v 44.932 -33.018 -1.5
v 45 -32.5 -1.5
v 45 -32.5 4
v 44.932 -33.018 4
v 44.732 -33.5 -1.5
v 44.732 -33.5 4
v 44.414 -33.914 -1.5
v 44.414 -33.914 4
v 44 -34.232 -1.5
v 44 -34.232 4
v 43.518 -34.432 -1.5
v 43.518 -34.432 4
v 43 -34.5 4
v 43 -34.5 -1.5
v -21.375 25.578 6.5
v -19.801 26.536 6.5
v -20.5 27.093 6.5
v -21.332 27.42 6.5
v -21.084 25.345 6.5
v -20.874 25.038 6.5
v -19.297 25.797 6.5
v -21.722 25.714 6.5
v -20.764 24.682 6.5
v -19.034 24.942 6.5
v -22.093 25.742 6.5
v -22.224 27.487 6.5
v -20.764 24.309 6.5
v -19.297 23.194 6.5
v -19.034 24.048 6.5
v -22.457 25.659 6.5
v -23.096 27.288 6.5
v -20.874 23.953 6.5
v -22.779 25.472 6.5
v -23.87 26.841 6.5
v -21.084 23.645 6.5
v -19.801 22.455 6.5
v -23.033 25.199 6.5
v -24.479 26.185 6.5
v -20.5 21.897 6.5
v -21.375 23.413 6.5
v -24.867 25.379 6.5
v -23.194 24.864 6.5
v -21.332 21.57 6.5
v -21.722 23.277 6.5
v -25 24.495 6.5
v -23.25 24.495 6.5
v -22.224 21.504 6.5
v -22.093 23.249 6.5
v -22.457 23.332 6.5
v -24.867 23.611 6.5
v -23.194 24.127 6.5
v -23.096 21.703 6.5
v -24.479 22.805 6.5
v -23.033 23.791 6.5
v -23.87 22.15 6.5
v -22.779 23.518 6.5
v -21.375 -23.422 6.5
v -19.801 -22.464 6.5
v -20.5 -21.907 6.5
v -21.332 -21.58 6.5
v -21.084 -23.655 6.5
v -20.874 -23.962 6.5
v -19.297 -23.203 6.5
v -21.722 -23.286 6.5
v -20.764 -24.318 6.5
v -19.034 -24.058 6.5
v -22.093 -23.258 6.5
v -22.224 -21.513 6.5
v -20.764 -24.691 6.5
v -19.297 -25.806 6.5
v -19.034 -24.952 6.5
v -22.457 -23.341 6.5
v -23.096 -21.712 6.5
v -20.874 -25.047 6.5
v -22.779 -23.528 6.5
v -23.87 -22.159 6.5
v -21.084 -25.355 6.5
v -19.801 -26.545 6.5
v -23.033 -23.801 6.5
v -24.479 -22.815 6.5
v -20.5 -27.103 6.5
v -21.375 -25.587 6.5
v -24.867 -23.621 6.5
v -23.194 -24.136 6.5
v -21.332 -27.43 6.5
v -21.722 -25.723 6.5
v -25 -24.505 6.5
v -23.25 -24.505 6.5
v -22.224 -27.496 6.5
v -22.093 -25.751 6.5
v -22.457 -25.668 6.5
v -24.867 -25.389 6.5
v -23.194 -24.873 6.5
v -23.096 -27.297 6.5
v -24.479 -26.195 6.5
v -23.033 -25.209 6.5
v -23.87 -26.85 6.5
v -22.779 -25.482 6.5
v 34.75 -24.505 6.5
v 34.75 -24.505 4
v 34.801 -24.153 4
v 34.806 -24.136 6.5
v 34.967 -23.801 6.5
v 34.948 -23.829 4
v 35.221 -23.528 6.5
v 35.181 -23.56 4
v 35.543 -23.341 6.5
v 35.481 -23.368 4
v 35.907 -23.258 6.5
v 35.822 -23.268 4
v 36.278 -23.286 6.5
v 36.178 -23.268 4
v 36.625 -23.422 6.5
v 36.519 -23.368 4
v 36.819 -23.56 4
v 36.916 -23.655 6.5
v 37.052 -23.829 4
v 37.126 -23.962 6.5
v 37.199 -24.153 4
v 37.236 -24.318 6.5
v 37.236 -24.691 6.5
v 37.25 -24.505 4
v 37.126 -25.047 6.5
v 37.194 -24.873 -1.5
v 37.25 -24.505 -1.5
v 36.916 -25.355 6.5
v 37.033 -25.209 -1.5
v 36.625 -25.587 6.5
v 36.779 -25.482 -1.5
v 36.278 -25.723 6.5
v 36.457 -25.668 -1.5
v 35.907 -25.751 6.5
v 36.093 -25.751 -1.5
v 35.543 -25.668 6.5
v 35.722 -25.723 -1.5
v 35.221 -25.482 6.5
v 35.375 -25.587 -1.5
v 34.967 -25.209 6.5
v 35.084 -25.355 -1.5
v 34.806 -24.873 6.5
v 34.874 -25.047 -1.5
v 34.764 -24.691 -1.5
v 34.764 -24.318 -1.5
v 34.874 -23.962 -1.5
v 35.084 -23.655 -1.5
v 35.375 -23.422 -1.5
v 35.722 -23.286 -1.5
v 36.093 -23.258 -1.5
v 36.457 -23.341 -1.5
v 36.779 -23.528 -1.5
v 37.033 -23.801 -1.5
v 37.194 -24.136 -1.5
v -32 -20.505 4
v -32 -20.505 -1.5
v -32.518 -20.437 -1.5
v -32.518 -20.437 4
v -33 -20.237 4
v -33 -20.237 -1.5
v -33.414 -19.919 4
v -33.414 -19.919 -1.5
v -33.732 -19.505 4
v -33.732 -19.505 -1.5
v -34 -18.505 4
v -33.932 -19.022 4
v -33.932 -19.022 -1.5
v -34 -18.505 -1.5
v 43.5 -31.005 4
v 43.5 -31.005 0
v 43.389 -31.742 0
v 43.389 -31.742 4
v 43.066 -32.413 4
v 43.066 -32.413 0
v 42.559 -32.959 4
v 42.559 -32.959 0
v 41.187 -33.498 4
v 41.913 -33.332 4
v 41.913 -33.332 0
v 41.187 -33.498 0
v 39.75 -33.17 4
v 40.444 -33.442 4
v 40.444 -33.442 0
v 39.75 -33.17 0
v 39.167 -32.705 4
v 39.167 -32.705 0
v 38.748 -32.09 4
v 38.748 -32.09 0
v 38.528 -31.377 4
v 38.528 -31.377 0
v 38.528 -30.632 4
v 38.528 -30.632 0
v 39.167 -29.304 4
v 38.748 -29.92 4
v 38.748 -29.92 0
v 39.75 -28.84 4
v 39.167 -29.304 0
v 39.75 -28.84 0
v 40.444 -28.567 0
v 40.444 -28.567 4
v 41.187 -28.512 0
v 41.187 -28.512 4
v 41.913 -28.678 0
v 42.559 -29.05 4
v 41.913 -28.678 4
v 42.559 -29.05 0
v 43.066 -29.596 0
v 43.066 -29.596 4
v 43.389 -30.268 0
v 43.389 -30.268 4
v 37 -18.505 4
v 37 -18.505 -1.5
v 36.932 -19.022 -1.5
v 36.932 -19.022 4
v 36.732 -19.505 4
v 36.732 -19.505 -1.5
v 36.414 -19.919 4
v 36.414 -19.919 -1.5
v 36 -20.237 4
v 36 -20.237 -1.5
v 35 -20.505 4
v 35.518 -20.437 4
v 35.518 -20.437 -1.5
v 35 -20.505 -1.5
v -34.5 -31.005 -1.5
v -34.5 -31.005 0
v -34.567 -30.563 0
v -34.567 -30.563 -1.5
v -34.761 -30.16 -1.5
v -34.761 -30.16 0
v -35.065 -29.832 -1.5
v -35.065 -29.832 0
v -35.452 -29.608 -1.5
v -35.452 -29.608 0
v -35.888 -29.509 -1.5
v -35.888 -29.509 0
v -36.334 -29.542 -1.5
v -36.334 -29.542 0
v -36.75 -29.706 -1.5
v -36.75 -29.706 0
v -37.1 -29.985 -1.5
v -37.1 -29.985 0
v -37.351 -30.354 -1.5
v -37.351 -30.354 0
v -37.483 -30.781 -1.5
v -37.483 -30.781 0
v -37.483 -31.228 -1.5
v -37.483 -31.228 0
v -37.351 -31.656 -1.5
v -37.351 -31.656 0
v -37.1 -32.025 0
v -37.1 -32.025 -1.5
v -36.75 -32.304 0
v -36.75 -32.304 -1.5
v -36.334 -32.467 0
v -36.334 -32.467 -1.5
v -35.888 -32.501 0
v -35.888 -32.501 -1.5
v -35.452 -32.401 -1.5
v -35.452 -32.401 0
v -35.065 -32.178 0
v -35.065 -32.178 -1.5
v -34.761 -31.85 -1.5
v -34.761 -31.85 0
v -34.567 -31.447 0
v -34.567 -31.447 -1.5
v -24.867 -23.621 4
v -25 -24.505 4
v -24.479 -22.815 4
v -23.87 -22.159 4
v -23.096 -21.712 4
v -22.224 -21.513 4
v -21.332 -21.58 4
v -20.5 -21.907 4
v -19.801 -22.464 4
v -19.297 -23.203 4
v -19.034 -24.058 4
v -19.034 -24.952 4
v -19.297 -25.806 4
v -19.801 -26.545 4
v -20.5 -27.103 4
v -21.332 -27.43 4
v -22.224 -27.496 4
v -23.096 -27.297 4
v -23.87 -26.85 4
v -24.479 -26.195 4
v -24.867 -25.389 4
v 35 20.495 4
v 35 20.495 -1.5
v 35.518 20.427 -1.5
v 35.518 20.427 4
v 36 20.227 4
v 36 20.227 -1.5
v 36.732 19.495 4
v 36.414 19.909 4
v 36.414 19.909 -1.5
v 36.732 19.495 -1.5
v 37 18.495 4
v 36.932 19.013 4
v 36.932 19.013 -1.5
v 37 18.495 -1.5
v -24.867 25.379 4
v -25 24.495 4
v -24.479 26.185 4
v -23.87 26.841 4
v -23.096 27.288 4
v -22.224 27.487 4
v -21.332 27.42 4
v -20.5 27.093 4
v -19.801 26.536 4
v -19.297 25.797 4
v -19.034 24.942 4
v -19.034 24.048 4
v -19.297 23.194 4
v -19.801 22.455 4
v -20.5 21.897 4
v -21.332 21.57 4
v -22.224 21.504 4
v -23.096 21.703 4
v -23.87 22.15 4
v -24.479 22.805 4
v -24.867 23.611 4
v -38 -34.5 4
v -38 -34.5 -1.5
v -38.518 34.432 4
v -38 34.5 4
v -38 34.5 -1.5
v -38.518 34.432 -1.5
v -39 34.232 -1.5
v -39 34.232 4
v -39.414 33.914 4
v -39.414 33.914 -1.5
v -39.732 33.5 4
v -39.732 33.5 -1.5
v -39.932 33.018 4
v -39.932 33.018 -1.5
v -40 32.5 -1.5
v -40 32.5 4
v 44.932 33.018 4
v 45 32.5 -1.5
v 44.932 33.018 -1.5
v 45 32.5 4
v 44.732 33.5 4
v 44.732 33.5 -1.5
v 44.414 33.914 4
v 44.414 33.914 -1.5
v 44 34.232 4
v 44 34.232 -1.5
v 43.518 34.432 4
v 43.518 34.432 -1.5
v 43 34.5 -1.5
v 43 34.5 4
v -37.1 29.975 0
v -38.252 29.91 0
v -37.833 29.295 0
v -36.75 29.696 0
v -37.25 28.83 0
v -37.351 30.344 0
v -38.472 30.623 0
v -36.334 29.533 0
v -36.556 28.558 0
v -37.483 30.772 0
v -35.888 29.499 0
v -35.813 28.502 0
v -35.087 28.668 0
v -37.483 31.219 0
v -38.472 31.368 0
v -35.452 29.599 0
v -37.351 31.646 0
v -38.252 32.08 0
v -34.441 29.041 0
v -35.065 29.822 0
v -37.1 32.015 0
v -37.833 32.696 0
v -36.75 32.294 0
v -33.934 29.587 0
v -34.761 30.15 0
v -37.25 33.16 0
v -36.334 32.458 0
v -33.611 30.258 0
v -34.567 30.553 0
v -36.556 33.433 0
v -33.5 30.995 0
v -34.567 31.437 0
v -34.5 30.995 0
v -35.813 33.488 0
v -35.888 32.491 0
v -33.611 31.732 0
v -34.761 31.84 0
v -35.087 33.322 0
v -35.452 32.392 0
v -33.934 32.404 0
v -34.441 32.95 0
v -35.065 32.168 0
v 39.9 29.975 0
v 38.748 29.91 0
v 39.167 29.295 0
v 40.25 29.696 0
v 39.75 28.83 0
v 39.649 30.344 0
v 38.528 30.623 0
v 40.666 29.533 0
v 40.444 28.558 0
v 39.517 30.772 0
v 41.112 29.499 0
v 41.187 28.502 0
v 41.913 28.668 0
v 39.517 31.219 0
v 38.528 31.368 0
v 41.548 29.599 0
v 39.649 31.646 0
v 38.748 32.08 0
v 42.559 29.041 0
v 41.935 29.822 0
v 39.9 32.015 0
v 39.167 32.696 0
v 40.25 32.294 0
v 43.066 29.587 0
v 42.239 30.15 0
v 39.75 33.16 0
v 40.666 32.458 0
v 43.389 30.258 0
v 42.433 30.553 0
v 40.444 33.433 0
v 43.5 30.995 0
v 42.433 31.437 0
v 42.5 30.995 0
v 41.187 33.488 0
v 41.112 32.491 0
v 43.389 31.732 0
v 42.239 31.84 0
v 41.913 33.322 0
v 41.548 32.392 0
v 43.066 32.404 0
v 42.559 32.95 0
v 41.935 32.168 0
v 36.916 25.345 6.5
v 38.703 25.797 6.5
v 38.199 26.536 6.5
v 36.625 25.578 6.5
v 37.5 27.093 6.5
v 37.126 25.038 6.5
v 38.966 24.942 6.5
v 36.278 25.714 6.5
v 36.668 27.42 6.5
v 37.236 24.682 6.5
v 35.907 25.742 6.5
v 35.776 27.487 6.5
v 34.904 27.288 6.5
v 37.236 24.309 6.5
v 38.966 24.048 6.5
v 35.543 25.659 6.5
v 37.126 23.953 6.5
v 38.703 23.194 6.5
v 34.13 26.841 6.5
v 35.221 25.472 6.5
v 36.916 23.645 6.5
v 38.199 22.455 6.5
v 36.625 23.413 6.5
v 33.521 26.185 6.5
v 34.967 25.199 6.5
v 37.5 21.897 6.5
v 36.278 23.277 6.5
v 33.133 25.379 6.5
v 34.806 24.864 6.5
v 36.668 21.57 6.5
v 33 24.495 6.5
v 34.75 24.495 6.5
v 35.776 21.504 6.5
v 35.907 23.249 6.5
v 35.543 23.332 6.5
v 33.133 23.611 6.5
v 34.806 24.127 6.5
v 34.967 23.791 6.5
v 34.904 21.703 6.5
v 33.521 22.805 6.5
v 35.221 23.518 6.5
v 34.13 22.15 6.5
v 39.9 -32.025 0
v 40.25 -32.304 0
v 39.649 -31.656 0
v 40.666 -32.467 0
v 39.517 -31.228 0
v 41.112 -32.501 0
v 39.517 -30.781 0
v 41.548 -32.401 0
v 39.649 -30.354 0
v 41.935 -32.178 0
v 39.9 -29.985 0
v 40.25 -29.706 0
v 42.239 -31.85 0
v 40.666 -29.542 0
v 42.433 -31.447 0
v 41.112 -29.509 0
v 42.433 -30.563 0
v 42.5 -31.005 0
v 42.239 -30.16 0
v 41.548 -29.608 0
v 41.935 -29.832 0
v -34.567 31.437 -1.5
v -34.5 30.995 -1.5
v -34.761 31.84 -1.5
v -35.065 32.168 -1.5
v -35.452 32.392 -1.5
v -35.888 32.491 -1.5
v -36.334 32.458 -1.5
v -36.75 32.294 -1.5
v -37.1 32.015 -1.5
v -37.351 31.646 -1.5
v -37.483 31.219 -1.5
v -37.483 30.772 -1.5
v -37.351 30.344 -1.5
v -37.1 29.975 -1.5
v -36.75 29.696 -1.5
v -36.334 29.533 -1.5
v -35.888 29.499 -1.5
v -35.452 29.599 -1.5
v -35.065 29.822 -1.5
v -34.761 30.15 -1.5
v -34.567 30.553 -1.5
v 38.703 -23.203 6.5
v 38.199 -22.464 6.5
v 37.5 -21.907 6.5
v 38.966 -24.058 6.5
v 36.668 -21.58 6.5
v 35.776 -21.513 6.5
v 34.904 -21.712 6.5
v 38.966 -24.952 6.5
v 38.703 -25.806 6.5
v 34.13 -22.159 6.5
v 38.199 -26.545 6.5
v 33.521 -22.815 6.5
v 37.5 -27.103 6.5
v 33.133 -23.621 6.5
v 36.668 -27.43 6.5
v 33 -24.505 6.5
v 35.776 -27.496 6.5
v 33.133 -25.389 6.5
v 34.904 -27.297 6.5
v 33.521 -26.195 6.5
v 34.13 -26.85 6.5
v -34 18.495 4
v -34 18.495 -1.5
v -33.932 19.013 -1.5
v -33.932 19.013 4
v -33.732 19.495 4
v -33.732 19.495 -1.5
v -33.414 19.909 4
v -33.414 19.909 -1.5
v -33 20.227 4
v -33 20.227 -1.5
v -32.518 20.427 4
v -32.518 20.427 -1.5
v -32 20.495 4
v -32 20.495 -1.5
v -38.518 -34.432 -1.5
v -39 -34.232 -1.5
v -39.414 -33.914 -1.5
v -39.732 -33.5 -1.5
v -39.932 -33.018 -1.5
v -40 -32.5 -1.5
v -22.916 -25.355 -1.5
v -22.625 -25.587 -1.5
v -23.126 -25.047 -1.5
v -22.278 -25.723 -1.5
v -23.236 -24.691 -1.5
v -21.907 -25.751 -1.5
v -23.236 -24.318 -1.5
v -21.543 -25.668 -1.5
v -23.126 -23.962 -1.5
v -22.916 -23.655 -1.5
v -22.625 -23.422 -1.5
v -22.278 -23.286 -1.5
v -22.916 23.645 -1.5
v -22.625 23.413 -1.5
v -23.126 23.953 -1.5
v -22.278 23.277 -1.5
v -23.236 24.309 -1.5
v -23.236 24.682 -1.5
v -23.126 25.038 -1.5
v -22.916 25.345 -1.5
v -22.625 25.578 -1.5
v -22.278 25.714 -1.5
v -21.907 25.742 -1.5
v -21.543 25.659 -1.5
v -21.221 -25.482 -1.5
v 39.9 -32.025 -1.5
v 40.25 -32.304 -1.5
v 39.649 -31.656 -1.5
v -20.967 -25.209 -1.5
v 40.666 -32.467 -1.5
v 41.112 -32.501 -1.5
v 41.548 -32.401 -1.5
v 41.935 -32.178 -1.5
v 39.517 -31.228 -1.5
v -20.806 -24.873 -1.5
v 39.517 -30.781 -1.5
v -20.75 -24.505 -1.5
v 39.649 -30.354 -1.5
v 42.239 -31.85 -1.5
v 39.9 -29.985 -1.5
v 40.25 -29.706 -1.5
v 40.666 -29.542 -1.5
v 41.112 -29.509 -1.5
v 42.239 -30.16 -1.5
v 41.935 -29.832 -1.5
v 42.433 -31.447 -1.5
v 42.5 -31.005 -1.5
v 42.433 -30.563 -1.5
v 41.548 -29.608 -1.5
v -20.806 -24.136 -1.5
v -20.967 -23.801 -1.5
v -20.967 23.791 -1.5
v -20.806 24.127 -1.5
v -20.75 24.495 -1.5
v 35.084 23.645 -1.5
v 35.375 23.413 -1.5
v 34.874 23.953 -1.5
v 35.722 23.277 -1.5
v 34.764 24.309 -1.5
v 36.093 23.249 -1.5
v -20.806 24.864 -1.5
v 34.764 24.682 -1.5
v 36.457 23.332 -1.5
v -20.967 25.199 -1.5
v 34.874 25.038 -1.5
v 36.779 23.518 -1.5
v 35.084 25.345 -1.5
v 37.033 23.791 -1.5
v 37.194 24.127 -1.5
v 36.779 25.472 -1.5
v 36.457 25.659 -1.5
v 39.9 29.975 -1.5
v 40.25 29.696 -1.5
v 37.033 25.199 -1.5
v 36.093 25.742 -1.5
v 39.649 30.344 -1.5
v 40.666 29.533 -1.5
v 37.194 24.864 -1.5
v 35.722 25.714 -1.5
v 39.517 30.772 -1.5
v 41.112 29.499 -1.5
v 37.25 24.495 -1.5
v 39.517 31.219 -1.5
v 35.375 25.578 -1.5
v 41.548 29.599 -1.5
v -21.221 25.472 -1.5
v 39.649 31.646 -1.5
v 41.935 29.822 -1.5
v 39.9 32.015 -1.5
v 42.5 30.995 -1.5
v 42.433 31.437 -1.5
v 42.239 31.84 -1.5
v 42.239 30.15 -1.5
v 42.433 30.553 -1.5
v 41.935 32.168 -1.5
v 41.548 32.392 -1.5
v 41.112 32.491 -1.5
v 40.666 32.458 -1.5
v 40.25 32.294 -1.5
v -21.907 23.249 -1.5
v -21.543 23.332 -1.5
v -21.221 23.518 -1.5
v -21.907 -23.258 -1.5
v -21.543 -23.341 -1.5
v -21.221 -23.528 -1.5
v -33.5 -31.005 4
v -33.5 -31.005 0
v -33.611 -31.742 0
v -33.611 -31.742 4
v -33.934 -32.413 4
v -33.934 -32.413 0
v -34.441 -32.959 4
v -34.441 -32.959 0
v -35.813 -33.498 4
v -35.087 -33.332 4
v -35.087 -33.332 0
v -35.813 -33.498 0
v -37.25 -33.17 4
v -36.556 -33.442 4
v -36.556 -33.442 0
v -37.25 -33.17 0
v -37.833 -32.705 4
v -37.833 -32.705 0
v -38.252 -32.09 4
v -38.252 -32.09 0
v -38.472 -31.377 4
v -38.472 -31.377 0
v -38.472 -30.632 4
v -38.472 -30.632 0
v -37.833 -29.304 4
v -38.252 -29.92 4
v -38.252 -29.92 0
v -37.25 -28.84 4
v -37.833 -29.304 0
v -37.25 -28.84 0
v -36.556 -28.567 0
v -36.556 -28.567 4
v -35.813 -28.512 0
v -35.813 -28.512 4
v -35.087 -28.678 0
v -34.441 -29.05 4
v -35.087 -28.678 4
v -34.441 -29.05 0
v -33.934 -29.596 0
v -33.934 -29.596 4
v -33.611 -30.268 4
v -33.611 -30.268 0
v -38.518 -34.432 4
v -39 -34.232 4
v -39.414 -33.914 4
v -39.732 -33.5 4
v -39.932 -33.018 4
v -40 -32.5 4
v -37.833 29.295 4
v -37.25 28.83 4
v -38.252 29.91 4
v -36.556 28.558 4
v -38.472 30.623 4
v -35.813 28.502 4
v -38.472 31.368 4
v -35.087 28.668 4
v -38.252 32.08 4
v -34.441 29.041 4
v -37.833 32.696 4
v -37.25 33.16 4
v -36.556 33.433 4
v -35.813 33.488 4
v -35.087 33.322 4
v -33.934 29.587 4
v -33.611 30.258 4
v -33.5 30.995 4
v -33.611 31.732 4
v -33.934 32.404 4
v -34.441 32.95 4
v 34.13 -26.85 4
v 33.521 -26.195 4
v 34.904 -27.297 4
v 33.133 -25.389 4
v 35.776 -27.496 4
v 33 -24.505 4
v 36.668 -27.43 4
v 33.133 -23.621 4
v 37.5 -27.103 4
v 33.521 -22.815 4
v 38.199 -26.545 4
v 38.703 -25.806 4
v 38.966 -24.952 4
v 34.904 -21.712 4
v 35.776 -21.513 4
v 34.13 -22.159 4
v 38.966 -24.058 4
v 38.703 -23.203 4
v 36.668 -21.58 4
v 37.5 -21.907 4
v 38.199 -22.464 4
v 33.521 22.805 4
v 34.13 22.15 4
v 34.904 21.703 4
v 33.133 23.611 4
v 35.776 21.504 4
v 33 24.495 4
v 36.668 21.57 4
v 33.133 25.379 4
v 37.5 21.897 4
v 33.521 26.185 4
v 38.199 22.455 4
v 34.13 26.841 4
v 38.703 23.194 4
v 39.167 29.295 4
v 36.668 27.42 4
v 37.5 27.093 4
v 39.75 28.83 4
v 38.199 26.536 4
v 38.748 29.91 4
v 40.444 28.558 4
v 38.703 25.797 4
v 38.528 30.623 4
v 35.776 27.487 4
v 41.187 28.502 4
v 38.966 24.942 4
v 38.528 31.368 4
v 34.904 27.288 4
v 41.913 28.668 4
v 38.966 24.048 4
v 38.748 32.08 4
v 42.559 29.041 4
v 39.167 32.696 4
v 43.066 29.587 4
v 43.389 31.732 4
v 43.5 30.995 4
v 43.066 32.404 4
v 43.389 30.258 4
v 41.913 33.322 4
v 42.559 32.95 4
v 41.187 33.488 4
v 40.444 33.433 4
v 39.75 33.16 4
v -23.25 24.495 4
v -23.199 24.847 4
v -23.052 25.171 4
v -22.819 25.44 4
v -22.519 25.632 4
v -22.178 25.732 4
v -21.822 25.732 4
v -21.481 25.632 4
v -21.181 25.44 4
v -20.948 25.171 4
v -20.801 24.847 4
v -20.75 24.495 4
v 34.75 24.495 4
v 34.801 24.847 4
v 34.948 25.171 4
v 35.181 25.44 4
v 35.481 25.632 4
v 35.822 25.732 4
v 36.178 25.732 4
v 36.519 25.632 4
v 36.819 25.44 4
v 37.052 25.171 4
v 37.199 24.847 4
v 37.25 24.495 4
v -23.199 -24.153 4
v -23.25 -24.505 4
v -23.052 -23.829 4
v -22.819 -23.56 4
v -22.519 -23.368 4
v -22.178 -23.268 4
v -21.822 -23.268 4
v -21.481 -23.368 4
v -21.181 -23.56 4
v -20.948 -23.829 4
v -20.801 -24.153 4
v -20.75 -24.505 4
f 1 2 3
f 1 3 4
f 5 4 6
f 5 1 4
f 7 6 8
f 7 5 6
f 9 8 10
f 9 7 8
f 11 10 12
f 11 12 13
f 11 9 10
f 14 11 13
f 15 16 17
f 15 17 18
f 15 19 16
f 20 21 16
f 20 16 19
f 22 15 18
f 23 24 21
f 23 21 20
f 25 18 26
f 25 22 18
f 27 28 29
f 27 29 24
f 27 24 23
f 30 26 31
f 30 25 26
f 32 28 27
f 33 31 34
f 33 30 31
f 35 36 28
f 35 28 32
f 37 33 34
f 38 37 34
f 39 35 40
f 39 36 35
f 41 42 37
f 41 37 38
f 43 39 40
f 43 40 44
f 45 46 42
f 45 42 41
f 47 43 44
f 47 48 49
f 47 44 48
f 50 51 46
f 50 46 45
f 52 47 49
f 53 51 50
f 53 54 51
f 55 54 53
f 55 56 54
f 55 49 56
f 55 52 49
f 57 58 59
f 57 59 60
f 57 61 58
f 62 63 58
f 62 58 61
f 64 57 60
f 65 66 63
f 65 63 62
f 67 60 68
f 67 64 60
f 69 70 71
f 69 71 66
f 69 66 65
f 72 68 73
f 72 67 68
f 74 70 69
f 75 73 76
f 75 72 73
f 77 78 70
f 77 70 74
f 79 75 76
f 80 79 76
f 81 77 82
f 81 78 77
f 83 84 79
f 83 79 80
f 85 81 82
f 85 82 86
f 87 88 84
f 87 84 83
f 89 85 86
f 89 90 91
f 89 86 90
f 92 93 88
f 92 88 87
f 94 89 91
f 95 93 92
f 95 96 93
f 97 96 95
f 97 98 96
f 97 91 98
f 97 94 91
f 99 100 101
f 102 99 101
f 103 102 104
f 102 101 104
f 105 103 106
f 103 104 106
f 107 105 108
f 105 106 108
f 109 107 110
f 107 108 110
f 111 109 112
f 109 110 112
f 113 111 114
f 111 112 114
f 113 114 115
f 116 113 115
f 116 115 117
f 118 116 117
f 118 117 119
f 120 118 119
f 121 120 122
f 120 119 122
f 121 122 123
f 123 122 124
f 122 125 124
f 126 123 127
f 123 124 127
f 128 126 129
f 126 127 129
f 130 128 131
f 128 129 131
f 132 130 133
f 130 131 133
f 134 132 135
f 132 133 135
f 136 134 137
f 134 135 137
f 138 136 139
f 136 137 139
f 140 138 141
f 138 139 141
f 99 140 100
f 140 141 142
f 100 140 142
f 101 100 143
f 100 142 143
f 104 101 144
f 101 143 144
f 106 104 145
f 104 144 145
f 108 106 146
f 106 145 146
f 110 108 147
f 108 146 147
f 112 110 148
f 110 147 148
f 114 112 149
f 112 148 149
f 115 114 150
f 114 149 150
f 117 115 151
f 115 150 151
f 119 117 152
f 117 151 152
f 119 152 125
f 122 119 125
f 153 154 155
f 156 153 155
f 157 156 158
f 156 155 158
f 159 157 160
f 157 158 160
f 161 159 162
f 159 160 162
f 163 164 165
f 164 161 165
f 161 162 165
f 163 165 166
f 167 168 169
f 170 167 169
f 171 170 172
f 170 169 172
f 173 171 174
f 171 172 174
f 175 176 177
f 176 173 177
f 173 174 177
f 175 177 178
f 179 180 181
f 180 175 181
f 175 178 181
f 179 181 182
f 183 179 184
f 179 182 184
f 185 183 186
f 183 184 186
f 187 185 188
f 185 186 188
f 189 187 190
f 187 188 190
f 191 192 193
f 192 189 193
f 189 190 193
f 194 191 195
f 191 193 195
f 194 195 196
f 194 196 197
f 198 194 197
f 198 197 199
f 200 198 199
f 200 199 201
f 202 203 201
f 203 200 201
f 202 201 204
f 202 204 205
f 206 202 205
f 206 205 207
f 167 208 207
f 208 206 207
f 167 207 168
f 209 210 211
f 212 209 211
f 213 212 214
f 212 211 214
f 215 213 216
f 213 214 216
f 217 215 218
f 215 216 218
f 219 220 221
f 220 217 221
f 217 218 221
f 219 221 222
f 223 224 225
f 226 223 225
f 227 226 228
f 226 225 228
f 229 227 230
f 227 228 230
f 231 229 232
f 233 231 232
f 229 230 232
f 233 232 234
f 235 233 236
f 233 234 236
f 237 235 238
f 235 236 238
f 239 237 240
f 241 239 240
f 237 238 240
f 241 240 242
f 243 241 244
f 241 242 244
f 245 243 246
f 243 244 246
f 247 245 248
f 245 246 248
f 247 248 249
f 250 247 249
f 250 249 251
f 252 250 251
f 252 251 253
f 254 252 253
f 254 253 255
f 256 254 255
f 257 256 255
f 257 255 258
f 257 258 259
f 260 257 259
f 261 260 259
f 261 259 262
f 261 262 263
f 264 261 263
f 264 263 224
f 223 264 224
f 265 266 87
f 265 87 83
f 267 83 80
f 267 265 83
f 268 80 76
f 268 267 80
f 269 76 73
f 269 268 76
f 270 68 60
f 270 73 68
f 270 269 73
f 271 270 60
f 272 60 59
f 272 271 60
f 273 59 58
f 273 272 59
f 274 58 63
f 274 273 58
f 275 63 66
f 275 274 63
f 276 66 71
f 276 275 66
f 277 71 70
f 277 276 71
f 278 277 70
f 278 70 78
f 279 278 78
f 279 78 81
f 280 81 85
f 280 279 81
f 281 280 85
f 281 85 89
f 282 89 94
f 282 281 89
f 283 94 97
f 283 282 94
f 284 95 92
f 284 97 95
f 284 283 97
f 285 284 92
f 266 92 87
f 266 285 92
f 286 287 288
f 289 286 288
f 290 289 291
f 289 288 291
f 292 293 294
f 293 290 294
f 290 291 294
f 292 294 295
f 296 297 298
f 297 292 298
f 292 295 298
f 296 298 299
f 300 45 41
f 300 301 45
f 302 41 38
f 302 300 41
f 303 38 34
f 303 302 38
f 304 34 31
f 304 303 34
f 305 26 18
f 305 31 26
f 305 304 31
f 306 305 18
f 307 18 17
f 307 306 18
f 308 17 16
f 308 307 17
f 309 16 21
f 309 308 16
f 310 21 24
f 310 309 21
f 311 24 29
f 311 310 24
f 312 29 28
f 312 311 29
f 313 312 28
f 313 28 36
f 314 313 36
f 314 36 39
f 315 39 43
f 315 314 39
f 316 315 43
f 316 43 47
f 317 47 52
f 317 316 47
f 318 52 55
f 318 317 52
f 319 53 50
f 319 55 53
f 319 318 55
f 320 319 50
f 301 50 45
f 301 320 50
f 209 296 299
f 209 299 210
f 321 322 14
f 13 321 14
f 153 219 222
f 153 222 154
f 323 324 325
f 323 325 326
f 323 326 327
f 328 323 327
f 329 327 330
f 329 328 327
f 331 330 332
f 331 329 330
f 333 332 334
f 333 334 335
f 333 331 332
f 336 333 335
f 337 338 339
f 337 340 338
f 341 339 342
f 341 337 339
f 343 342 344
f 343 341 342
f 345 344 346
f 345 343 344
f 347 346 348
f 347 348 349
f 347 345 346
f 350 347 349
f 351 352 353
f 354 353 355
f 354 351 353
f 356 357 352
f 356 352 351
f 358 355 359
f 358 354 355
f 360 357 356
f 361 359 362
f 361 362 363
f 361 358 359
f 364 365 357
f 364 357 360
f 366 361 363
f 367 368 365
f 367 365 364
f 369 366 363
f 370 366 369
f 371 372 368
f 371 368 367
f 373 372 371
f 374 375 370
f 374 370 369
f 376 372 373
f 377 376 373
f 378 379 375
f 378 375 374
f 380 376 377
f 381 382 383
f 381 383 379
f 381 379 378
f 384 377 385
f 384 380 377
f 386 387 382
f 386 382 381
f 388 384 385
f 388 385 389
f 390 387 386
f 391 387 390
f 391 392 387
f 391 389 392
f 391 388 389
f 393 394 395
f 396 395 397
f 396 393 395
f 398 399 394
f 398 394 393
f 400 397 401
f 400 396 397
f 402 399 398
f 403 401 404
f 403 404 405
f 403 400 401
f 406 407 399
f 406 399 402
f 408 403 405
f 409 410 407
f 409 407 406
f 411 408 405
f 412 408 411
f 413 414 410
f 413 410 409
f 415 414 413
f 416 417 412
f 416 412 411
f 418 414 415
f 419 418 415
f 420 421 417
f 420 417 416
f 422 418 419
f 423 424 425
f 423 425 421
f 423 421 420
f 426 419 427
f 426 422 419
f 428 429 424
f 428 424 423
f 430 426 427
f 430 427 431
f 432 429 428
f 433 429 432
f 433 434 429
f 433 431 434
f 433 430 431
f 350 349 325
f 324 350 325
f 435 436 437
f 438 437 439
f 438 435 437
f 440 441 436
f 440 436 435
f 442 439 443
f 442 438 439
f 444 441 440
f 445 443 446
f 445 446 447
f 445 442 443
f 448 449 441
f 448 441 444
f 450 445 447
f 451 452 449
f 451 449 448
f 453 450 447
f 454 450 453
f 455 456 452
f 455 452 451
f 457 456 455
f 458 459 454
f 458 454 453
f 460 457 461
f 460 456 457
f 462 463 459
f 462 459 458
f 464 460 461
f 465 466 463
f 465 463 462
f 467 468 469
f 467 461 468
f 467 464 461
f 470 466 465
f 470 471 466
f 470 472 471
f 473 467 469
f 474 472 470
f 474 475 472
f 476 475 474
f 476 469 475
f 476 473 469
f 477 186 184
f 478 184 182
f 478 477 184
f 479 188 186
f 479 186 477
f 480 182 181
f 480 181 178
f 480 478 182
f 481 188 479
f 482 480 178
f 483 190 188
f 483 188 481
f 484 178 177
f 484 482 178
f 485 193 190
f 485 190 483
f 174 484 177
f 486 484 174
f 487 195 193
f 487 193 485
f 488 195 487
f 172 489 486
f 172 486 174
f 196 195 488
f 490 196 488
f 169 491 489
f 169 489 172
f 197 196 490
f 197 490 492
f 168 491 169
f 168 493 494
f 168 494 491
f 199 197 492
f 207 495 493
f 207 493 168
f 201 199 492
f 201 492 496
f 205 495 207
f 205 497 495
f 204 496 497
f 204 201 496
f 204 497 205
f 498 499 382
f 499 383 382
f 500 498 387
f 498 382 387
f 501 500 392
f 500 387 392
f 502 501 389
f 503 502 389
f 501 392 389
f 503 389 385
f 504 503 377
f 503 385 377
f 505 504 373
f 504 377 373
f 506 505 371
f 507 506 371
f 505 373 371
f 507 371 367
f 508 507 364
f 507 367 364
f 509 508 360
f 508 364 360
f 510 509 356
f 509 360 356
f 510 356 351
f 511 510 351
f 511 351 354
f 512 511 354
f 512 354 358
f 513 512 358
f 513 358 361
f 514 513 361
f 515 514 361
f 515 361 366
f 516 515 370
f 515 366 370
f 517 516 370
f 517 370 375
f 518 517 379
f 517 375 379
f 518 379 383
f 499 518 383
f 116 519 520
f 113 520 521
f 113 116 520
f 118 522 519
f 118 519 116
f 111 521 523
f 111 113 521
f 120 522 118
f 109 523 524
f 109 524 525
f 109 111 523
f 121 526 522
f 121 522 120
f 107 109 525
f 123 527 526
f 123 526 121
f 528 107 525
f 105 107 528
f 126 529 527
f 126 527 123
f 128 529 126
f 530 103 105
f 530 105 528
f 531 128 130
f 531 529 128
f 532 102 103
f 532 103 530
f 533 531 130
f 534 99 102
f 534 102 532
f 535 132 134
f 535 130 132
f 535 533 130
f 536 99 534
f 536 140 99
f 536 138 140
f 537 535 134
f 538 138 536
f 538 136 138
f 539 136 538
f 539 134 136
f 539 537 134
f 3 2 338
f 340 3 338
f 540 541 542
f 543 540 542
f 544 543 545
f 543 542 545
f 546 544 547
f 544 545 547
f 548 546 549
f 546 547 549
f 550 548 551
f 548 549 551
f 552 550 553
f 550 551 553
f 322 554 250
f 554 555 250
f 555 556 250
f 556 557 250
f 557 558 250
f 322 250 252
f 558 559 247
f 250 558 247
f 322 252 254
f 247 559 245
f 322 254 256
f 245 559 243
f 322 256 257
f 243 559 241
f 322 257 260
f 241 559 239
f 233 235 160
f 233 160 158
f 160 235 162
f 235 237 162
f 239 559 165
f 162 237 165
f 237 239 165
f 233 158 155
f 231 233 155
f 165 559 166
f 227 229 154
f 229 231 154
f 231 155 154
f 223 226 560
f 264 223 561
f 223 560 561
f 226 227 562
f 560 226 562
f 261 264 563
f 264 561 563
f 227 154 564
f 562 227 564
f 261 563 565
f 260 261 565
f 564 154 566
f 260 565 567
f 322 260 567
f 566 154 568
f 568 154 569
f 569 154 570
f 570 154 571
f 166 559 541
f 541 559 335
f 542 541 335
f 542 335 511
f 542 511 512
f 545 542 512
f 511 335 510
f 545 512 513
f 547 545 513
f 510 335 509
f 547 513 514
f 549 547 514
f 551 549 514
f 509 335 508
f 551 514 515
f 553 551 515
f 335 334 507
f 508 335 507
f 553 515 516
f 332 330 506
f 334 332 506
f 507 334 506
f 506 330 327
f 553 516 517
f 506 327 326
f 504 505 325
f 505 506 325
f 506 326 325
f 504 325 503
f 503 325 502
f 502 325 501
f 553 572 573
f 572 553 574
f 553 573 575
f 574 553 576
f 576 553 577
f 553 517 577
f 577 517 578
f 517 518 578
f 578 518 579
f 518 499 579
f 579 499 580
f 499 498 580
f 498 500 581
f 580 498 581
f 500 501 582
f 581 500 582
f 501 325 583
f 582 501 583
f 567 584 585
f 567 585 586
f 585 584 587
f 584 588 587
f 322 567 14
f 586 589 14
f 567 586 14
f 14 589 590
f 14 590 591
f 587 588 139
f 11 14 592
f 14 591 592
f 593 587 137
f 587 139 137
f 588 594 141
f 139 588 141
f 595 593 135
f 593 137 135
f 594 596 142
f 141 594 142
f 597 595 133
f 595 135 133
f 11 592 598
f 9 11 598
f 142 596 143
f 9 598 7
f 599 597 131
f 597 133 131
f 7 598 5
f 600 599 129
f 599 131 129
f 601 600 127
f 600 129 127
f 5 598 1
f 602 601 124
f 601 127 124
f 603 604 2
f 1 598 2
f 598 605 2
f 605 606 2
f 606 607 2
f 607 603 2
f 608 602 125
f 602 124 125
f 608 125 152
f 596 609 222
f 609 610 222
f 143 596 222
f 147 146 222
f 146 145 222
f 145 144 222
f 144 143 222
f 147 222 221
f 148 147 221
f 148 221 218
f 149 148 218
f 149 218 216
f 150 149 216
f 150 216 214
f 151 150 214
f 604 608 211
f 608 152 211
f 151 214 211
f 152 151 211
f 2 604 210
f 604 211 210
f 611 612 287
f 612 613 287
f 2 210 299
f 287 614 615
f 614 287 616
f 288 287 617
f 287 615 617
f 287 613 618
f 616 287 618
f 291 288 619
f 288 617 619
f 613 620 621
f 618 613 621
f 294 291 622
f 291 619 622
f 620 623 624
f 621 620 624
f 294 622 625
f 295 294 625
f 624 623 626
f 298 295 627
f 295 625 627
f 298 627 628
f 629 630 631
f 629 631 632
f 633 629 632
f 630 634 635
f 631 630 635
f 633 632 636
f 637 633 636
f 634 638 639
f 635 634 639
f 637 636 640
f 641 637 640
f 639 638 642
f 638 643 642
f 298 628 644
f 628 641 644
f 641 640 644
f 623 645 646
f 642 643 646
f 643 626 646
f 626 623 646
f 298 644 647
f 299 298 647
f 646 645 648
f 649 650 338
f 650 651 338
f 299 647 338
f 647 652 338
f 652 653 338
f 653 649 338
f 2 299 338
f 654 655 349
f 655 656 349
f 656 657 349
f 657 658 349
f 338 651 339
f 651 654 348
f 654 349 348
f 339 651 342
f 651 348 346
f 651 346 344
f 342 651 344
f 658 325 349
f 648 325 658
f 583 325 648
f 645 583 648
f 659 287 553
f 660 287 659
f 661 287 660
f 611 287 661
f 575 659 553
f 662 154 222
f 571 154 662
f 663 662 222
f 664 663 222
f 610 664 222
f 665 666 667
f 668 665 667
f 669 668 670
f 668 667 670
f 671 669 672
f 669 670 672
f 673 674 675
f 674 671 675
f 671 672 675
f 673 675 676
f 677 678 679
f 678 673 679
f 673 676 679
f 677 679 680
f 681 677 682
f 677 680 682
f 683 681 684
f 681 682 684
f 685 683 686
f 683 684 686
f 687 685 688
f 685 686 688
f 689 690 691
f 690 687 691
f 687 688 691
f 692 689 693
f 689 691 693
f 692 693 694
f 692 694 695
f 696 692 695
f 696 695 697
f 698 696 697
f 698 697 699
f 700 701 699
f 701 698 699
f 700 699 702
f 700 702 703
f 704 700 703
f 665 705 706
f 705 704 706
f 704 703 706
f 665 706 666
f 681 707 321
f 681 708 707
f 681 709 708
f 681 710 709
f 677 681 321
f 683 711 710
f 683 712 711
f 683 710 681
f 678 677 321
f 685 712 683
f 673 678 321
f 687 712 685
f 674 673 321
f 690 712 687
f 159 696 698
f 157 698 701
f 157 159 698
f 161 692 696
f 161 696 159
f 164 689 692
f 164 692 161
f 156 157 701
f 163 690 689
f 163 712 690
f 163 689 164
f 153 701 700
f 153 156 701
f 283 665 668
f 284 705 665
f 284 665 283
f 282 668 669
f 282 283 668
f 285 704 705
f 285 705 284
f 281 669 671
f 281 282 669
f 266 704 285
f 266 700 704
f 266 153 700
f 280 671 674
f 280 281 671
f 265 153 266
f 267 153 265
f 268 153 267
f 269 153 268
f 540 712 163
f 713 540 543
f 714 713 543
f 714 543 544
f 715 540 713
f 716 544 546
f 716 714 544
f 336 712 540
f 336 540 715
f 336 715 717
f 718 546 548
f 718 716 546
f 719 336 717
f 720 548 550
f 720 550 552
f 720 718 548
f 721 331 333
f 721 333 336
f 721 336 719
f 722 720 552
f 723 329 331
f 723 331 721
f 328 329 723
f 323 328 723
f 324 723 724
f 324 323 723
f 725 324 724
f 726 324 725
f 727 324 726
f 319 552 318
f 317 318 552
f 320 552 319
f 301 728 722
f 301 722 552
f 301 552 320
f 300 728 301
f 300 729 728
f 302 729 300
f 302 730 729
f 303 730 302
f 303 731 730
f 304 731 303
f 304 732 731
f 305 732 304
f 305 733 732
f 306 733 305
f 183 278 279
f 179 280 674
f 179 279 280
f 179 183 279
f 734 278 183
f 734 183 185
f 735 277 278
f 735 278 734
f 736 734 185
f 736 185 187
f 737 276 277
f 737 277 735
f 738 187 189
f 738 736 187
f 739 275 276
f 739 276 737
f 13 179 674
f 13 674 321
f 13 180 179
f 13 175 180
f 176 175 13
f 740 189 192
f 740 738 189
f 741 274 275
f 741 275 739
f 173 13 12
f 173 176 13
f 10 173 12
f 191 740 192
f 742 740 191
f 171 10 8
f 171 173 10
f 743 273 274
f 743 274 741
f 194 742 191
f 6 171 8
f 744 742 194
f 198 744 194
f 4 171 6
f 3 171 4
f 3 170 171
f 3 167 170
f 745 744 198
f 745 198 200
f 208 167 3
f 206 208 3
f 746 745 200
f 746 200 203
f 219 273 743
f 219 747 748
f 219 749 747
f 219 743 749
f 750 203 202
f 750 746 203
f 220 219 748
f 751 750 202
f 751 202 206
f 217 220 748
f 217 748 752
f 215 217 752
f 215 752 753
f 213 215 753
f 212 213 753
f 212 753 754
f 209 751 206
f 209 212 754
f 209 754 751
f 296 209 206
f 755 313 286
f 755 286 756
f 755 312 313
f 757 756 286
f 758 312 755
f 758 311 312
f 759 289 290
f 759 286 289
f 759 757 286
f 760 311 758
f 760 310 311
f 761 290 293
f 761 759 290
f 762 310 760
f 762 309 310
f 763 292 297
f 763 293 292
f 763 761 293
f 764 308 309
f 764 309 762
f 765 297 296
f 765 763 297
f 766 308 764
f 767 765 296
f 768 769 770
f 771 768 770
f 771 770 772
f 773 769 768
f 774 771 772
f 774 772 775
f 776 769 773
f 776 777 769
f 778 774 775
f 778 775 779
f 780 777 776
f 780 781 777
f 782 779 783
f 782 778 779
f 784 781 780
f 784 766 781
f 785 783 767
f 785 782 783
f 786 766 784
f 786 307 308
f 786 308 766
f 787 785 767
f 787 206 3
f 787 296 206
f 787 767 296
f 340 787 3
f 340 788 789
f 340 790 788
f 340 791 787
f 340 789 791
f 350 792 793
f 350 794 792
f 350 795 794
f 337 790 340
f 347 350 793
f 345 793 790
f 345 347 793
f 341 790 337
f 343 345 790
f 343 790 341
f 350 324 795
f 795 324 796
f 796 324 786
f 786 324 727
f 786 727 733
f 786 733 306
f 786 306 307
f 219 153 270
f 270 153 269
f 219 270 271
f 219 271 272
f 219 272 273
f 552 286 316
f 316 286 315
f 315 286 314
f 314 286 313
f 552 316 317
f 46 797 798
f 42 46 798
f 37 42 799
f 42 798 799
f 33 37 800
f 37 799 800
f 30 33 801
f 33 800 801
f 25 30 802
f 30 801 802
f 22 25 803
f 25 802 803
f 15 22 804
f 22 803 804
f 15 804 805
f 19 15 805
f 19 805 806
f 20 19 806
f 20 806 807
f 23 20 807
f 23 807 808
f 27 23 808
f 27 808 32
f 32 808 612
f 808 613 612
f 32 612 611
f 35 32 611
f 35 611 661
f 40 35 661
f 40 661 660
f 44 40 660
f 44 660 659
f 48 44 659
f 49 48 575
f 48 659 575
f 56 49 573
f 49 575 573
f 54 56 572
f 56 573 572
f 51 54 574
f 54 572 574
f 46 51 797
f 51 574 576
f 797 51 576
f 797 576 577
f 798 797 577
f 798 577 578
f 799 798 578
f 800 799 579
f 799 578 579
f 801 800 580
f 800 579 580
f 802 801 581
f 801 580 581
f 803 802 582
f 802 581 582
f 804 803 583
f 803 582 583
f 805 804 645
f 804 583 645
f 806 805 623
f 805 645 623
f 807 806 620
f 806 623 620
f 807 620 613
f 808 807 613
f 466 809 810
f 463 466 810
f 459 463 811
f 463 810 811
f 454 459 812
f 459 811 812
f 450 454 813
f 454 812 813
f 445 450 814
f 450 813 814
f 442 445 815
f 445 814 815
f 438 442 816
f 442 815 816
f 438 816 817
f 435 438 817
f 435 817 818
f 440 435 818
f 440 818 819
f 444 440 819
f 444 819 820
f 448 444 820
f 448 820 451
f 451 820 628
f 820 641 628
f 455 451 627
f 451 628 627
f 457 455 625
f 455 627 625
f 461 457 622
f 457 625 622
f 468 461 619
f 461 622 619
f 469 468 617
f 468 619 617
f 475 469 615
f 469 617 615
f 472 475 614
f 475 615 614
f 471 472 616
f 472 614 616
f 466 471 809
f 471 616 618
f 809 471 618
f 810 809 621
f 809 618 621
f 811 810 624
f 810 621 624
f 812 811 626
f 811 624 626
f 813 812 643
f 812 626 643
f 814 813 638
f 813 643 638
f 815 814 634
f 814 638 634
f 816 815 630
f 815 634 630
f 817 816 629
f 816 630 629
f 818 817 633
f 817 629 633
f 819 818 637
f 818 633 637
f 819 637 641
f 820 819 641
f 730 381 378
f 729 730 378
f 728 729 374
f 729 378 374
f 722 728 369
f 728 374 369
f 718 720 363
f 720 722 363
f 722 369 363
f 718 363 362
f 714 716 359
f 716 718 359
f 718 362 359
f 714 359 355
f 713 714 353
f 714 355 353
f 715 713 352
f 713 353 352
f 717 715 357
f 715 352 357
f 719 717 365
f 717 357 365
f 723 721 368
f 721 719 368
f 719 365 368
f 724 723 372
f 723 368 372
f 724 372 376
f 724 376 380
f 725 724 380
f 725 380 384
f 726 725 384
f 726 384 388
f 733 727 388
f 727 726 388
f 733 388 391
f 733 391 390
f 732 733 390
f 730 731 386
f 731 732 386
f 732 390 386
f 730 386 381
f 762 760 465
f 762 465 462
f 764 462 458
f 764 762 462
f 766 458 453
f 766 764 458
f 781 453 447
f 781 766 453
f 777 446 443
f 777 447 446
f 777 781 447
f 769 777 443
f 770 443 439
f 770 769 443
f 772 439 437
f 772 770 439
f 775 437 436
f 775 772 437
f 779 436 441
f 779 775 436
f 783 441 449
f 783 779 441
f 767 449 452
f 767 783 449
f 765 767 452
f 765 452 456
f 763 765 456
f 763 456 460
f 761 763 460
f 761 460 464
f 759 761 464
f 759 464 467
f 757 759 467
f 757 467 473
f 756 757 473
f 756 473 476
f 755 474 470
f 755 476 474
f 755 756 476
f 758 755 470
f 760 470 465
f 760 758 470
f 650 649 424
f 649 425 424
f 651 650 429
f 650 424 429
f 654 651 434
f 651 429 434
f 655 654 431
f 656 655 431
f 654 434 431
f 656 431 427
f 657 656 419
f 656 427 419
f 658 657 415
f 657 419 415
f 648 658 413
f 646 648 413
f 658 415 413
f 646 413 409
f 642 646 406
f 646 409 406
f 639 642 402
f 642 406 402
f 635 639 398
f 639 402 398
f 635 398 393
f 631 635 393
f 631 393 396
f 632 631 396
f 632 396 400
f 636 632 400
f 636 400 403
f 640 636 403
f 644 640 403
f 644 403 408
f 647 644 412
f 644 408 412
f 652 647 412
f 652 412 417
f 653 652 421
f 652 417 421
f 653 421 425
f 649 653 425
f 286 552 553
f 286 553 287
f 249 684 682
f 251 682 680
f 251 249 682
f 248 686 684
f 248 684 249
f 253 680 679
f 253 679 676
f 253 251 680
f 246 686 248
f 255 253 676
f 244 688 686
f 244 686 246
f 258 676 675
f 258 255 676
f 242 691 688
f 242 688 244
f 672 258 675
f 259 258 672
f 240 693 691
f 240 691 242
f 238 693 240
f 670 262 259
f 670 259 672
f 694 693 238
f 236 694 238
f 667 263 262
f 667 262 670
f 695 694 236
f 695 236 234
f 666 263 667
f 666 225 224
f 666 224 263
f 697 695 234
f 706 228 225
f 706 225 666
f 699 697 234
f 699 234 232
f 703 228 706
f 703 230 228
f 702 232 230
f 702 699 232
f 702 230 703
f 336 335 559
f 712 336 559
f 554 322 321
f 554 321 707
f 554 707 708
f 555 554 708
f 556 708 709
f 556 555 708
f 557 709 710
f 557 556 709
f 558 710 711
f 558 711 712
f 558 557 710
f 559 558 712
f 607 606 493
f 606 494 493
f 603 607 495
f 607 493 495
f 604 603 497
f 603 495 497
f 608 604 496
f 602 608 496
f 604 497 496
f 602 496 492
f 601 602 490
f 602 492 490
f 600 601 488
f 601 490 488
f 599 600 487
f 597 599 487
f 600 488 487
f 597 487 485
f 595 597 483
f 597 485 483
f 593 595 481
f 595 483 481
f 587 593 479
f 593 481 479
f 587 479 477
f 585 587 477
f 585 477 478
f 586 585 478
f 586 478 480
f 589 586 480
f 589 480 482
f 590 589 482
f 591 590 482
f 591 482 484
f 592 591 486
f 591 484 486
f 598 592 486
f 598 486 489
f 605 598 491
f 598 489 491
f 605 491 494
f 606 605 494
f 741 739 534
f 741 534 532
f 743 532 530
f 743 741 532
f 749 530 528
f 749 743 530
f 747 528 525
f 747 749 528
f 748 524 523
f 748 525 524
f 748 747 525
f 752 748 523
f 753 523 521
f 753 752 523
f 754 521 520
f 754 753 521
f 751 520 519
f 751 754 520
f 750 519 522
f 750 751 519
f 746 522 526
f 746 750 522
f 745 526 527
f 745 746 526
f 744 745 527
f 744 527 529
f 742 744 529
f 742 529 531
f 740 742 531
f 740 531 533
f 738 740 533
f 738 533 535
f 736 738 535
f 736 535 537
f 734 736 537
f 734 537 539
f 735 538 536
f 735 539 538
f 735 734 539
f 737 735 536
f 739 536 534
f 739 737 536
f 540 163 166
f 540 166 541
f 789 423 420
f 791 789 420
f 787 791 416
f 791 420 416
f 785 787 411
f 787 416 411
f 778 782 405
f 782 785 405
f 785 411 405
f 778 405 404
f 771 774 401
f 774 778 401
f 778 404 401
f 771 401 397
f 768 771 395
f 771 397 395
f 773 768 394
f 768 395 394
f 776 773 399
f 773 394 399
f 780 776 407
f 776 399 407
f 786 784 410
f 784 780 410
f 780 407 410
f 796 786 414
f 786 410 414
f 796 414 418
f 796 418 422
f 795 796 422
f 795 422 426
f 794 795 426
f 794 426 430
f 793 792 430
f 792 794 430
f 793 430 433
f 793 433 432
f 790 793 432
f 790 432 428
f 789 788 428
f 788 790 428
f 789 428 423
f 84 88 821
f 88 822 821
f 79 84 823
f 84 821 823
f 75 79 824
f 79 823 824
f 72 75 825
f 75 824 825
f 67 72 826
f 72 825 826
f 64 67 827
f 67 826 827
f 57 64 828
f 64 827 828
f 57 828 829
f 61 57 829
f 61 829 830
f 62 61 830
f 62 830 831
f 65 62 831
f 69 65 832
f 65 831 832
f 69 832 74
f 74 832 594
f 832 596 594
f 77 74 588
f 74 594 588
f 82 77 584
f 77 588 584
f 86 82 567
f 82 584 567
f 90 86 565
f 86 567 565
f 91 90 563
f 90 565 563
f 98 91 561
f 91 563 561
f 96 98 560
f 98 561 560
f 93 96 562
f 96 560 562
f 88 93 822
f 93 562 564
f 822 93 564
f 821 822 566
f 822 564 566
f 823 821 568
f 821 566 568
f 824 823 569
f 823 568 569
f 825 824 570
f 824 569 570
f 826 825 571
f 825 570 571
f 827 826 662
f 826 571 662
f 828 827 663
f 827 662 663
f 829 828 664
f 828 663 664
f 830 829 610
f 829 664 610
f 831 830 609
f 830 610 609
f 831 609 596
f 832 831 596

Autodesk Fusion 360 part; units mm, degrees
sketch "Sketch1" plane through (0, 0, 0) normal (0, 0, 1) x (1, 0, 0)
  line L0 (45, 34.5) -> (-40, 34.5)
  line L1 (-40, 34.5) -> (-40, -34.5)
  line L2 (-40, -34.5) -> (45, -34.5)
  line L3 (45, -34.5) -> (45, 34.5)
  circle A0 centre (41, 30.9952) radius 1.5
  line L4 (0, 56) -> (0, -61) construction
  line L5 (-71, -0.0048) -> (62, -0.0048) construction
  circle A1 centre (41, 30.9952) radius 2.5
  circle A2 centre (-36, 30.9952) radius 1.5
  circle A3 centre (-36, 30.9952) radius 2.5
  circle A4 centre (41, -31.0048) radius 1.5
  circle A5 centre (41, -31.0048) radius 2.5
  circle A6 centre (-36, -31.0048) radius 1.5
  circle A7 centre (-36, -31.0048) radius 2.5
  circle A8 centre (36, 24.4952) radius 1.25
  circle A9 centre (-22, 24.4952) radius 1.25
  circle A10 centre (36, -24.5048) radius 1.25
  circle A11 centre (-22, -24.5048) radius 1.25
  dimension "d1" = 85
  dimension "d2" = 69
  dimension "d3" = 3
  dimension "d8" = 5
  dimension "d13" = 2.5
  dimension "d14" = 24.5
  dimension "d17" = -58
  dimension "d18" = -49
  dimension "d45" = 41
  dimension "d46" = 41
  dimension "d47" = 41
extrude "Extrude1" add sketch "Sketch1" against normal blind 1.5 contours L0 L1 L2 L3 | A1 | A3 | A5 | A7
extrude "Extrude2" add sketch "Sketch1" along normal blind 4 contours L0 L1 L2 L3
fillet "Fillet1" radius 2 4 edges at (-40, -34.5, 1.25) (45, -34.5, 1.25) (45, 34.5, 1.25) (-40, 34.5, 1.25)
sketch "Sketch2" plane through (0, 0, 4) normal (0, 0, 1) x (-1, 0, 0)
  circle A0 centre (22, 24.5048) radius 1.25
  circle A1 centre (22, -24.4952) radius 1.25
  circle A2 centre (-36, 24.5048) radius 1.25
  circle A3 centre (-41, 31.0048) radius 2.5
  circle A4 centre (36, -30.9952) radius 2.5
  circle A5 centre (-36, -24.4952) radius 1.25
  circle A6 centre (36, 31.0048) radius 2.5
  circle A7 centre (-41, -30.9952) radius 2.5
  arc A8 (38, -34.5) -> (40, -32.5) centre (38, -32.5) ccw
  line L0 (40, -32.5) -> (40, 32.5)
  arc A9 (40, 32.5) -> (38, 34.5) centre (38, 32.5) ccw
  line L1 (38, 34.5) -> (-43, 34.5)
  arc A10 (-43, 34.5) -> (-45, 32.5) centre (-43, 32.5) ccw
  line L2 (-45, 32.5) -> (-45, -32.5)
  arc A11 (-45, -32.5) -> (-43, -34.5) centre (-43, -32.5) ccw
  line L3 (-43, -34.5) -> (38, -34.5)
  line L4 (34, -20.4952) -> (-37, -20.4952)
  line L5 (-37, -20.4952) -> (-37, 20.5048)
  line L6 (-37, 20.5048) -> (34, 20.5048)
  line L7 (34, 20.5048) -> (34, -20.4952)
  dimension "d28" = 4
  dimension "d29" = 6
  dimension "d30" = 8
extrude "Extrude3" cut sketch "Sketch2" against normal blind 5.5 contours L4 L5 L6 L7
fillet "Fillet2" radius 2 4 edges at (-34, 20.4952, 1.25) (-34, -20.5048, 1.25) (37, -20.5048, 1.25) (37, 20.4952, 1.25)
sketch "Sketch3" plane through (0, 0, 4) normal (0, 0, 1) x (-1, 0, 0)
  line L0 (-37, -18.4952) -> (-37, 18.5048)
  arc A0 (-35, 20.5048) -> (-37, 18.5048) centre (-35, 18.5048) ccw
  line L1 (-35, 20.5048) -> (32, 20.5048)
  arc A1 (34, 18.5048) -> (32, 20.5048) centre (32, 18.5048) ccw
  line L2 (34, 18.5048) -> (34, -18.4952)
  arc A2 (32, -20.4952) -> (34, -18.4952) centre (32, -18.4952) ccw
  line L3 (32, -20.4952) -> (-35, -20.4952)
  arc A3 (-37, -18.4952) -> (-35, -20.4952) centre (-35, -18.4952) ccw
  circle A4 centre (22, 24.5048) radius 1.25
  circle A5 centre (22, -24.4952) radius 1.25
  circle A6 centre (-36, 24.5048) radius 1.25
  circle A7 centre (-41, 31.0048) radius 2.5
  circle A8 centre (36, -30.9952) radius 2.5
  circle A9 centre (-36, -24.4952) radius 1.25
  circle A10 centre (36, 31.0048) radius 2.5
  circle A11 centre (-41, -30.9952) radius 2.5
  arc A12 (38, -34.5) -> (40, -32.5) centre (38, -32.5) ccw
  line L4 (40, -32.5) -> (40, 32.5)
  arc A13 (40, 32.5) -> (38, 34.5) centre (38, 32.5) ccw
  line L5 (38, 34.5) -> (-43, 34.5)
  arc A14 (-43, 34.5) -> (-45, 32.5) centre (-43, 32.5) ccw
  line L6 (-45, 32.5) -> (-45, -32.5)
  arc A15 (-45, -32.5) -> (-43, -34.5) centre (-43, -32.5) ccw
  line L7 (-43, -34.5) -> (38, -34.5)
  circle A16 centre (22, -24.4952) radius 3
  circle A17 centre (-36, -24.4952) radius 3
  circle A18 centre (22, 24.5048) radius 3
  circle A19 centre (-36, 24.5048) radius 3
  dimension "d35" = 6
  dimension "d38" = -58
  dimension "d39" = 49
extrude "Extrude4" add sketch "Sketch3" along normal blind 2.5 contours A16 | A17 | A18 | A19
equation "d46 = d45"
equation "d47 = d45"
